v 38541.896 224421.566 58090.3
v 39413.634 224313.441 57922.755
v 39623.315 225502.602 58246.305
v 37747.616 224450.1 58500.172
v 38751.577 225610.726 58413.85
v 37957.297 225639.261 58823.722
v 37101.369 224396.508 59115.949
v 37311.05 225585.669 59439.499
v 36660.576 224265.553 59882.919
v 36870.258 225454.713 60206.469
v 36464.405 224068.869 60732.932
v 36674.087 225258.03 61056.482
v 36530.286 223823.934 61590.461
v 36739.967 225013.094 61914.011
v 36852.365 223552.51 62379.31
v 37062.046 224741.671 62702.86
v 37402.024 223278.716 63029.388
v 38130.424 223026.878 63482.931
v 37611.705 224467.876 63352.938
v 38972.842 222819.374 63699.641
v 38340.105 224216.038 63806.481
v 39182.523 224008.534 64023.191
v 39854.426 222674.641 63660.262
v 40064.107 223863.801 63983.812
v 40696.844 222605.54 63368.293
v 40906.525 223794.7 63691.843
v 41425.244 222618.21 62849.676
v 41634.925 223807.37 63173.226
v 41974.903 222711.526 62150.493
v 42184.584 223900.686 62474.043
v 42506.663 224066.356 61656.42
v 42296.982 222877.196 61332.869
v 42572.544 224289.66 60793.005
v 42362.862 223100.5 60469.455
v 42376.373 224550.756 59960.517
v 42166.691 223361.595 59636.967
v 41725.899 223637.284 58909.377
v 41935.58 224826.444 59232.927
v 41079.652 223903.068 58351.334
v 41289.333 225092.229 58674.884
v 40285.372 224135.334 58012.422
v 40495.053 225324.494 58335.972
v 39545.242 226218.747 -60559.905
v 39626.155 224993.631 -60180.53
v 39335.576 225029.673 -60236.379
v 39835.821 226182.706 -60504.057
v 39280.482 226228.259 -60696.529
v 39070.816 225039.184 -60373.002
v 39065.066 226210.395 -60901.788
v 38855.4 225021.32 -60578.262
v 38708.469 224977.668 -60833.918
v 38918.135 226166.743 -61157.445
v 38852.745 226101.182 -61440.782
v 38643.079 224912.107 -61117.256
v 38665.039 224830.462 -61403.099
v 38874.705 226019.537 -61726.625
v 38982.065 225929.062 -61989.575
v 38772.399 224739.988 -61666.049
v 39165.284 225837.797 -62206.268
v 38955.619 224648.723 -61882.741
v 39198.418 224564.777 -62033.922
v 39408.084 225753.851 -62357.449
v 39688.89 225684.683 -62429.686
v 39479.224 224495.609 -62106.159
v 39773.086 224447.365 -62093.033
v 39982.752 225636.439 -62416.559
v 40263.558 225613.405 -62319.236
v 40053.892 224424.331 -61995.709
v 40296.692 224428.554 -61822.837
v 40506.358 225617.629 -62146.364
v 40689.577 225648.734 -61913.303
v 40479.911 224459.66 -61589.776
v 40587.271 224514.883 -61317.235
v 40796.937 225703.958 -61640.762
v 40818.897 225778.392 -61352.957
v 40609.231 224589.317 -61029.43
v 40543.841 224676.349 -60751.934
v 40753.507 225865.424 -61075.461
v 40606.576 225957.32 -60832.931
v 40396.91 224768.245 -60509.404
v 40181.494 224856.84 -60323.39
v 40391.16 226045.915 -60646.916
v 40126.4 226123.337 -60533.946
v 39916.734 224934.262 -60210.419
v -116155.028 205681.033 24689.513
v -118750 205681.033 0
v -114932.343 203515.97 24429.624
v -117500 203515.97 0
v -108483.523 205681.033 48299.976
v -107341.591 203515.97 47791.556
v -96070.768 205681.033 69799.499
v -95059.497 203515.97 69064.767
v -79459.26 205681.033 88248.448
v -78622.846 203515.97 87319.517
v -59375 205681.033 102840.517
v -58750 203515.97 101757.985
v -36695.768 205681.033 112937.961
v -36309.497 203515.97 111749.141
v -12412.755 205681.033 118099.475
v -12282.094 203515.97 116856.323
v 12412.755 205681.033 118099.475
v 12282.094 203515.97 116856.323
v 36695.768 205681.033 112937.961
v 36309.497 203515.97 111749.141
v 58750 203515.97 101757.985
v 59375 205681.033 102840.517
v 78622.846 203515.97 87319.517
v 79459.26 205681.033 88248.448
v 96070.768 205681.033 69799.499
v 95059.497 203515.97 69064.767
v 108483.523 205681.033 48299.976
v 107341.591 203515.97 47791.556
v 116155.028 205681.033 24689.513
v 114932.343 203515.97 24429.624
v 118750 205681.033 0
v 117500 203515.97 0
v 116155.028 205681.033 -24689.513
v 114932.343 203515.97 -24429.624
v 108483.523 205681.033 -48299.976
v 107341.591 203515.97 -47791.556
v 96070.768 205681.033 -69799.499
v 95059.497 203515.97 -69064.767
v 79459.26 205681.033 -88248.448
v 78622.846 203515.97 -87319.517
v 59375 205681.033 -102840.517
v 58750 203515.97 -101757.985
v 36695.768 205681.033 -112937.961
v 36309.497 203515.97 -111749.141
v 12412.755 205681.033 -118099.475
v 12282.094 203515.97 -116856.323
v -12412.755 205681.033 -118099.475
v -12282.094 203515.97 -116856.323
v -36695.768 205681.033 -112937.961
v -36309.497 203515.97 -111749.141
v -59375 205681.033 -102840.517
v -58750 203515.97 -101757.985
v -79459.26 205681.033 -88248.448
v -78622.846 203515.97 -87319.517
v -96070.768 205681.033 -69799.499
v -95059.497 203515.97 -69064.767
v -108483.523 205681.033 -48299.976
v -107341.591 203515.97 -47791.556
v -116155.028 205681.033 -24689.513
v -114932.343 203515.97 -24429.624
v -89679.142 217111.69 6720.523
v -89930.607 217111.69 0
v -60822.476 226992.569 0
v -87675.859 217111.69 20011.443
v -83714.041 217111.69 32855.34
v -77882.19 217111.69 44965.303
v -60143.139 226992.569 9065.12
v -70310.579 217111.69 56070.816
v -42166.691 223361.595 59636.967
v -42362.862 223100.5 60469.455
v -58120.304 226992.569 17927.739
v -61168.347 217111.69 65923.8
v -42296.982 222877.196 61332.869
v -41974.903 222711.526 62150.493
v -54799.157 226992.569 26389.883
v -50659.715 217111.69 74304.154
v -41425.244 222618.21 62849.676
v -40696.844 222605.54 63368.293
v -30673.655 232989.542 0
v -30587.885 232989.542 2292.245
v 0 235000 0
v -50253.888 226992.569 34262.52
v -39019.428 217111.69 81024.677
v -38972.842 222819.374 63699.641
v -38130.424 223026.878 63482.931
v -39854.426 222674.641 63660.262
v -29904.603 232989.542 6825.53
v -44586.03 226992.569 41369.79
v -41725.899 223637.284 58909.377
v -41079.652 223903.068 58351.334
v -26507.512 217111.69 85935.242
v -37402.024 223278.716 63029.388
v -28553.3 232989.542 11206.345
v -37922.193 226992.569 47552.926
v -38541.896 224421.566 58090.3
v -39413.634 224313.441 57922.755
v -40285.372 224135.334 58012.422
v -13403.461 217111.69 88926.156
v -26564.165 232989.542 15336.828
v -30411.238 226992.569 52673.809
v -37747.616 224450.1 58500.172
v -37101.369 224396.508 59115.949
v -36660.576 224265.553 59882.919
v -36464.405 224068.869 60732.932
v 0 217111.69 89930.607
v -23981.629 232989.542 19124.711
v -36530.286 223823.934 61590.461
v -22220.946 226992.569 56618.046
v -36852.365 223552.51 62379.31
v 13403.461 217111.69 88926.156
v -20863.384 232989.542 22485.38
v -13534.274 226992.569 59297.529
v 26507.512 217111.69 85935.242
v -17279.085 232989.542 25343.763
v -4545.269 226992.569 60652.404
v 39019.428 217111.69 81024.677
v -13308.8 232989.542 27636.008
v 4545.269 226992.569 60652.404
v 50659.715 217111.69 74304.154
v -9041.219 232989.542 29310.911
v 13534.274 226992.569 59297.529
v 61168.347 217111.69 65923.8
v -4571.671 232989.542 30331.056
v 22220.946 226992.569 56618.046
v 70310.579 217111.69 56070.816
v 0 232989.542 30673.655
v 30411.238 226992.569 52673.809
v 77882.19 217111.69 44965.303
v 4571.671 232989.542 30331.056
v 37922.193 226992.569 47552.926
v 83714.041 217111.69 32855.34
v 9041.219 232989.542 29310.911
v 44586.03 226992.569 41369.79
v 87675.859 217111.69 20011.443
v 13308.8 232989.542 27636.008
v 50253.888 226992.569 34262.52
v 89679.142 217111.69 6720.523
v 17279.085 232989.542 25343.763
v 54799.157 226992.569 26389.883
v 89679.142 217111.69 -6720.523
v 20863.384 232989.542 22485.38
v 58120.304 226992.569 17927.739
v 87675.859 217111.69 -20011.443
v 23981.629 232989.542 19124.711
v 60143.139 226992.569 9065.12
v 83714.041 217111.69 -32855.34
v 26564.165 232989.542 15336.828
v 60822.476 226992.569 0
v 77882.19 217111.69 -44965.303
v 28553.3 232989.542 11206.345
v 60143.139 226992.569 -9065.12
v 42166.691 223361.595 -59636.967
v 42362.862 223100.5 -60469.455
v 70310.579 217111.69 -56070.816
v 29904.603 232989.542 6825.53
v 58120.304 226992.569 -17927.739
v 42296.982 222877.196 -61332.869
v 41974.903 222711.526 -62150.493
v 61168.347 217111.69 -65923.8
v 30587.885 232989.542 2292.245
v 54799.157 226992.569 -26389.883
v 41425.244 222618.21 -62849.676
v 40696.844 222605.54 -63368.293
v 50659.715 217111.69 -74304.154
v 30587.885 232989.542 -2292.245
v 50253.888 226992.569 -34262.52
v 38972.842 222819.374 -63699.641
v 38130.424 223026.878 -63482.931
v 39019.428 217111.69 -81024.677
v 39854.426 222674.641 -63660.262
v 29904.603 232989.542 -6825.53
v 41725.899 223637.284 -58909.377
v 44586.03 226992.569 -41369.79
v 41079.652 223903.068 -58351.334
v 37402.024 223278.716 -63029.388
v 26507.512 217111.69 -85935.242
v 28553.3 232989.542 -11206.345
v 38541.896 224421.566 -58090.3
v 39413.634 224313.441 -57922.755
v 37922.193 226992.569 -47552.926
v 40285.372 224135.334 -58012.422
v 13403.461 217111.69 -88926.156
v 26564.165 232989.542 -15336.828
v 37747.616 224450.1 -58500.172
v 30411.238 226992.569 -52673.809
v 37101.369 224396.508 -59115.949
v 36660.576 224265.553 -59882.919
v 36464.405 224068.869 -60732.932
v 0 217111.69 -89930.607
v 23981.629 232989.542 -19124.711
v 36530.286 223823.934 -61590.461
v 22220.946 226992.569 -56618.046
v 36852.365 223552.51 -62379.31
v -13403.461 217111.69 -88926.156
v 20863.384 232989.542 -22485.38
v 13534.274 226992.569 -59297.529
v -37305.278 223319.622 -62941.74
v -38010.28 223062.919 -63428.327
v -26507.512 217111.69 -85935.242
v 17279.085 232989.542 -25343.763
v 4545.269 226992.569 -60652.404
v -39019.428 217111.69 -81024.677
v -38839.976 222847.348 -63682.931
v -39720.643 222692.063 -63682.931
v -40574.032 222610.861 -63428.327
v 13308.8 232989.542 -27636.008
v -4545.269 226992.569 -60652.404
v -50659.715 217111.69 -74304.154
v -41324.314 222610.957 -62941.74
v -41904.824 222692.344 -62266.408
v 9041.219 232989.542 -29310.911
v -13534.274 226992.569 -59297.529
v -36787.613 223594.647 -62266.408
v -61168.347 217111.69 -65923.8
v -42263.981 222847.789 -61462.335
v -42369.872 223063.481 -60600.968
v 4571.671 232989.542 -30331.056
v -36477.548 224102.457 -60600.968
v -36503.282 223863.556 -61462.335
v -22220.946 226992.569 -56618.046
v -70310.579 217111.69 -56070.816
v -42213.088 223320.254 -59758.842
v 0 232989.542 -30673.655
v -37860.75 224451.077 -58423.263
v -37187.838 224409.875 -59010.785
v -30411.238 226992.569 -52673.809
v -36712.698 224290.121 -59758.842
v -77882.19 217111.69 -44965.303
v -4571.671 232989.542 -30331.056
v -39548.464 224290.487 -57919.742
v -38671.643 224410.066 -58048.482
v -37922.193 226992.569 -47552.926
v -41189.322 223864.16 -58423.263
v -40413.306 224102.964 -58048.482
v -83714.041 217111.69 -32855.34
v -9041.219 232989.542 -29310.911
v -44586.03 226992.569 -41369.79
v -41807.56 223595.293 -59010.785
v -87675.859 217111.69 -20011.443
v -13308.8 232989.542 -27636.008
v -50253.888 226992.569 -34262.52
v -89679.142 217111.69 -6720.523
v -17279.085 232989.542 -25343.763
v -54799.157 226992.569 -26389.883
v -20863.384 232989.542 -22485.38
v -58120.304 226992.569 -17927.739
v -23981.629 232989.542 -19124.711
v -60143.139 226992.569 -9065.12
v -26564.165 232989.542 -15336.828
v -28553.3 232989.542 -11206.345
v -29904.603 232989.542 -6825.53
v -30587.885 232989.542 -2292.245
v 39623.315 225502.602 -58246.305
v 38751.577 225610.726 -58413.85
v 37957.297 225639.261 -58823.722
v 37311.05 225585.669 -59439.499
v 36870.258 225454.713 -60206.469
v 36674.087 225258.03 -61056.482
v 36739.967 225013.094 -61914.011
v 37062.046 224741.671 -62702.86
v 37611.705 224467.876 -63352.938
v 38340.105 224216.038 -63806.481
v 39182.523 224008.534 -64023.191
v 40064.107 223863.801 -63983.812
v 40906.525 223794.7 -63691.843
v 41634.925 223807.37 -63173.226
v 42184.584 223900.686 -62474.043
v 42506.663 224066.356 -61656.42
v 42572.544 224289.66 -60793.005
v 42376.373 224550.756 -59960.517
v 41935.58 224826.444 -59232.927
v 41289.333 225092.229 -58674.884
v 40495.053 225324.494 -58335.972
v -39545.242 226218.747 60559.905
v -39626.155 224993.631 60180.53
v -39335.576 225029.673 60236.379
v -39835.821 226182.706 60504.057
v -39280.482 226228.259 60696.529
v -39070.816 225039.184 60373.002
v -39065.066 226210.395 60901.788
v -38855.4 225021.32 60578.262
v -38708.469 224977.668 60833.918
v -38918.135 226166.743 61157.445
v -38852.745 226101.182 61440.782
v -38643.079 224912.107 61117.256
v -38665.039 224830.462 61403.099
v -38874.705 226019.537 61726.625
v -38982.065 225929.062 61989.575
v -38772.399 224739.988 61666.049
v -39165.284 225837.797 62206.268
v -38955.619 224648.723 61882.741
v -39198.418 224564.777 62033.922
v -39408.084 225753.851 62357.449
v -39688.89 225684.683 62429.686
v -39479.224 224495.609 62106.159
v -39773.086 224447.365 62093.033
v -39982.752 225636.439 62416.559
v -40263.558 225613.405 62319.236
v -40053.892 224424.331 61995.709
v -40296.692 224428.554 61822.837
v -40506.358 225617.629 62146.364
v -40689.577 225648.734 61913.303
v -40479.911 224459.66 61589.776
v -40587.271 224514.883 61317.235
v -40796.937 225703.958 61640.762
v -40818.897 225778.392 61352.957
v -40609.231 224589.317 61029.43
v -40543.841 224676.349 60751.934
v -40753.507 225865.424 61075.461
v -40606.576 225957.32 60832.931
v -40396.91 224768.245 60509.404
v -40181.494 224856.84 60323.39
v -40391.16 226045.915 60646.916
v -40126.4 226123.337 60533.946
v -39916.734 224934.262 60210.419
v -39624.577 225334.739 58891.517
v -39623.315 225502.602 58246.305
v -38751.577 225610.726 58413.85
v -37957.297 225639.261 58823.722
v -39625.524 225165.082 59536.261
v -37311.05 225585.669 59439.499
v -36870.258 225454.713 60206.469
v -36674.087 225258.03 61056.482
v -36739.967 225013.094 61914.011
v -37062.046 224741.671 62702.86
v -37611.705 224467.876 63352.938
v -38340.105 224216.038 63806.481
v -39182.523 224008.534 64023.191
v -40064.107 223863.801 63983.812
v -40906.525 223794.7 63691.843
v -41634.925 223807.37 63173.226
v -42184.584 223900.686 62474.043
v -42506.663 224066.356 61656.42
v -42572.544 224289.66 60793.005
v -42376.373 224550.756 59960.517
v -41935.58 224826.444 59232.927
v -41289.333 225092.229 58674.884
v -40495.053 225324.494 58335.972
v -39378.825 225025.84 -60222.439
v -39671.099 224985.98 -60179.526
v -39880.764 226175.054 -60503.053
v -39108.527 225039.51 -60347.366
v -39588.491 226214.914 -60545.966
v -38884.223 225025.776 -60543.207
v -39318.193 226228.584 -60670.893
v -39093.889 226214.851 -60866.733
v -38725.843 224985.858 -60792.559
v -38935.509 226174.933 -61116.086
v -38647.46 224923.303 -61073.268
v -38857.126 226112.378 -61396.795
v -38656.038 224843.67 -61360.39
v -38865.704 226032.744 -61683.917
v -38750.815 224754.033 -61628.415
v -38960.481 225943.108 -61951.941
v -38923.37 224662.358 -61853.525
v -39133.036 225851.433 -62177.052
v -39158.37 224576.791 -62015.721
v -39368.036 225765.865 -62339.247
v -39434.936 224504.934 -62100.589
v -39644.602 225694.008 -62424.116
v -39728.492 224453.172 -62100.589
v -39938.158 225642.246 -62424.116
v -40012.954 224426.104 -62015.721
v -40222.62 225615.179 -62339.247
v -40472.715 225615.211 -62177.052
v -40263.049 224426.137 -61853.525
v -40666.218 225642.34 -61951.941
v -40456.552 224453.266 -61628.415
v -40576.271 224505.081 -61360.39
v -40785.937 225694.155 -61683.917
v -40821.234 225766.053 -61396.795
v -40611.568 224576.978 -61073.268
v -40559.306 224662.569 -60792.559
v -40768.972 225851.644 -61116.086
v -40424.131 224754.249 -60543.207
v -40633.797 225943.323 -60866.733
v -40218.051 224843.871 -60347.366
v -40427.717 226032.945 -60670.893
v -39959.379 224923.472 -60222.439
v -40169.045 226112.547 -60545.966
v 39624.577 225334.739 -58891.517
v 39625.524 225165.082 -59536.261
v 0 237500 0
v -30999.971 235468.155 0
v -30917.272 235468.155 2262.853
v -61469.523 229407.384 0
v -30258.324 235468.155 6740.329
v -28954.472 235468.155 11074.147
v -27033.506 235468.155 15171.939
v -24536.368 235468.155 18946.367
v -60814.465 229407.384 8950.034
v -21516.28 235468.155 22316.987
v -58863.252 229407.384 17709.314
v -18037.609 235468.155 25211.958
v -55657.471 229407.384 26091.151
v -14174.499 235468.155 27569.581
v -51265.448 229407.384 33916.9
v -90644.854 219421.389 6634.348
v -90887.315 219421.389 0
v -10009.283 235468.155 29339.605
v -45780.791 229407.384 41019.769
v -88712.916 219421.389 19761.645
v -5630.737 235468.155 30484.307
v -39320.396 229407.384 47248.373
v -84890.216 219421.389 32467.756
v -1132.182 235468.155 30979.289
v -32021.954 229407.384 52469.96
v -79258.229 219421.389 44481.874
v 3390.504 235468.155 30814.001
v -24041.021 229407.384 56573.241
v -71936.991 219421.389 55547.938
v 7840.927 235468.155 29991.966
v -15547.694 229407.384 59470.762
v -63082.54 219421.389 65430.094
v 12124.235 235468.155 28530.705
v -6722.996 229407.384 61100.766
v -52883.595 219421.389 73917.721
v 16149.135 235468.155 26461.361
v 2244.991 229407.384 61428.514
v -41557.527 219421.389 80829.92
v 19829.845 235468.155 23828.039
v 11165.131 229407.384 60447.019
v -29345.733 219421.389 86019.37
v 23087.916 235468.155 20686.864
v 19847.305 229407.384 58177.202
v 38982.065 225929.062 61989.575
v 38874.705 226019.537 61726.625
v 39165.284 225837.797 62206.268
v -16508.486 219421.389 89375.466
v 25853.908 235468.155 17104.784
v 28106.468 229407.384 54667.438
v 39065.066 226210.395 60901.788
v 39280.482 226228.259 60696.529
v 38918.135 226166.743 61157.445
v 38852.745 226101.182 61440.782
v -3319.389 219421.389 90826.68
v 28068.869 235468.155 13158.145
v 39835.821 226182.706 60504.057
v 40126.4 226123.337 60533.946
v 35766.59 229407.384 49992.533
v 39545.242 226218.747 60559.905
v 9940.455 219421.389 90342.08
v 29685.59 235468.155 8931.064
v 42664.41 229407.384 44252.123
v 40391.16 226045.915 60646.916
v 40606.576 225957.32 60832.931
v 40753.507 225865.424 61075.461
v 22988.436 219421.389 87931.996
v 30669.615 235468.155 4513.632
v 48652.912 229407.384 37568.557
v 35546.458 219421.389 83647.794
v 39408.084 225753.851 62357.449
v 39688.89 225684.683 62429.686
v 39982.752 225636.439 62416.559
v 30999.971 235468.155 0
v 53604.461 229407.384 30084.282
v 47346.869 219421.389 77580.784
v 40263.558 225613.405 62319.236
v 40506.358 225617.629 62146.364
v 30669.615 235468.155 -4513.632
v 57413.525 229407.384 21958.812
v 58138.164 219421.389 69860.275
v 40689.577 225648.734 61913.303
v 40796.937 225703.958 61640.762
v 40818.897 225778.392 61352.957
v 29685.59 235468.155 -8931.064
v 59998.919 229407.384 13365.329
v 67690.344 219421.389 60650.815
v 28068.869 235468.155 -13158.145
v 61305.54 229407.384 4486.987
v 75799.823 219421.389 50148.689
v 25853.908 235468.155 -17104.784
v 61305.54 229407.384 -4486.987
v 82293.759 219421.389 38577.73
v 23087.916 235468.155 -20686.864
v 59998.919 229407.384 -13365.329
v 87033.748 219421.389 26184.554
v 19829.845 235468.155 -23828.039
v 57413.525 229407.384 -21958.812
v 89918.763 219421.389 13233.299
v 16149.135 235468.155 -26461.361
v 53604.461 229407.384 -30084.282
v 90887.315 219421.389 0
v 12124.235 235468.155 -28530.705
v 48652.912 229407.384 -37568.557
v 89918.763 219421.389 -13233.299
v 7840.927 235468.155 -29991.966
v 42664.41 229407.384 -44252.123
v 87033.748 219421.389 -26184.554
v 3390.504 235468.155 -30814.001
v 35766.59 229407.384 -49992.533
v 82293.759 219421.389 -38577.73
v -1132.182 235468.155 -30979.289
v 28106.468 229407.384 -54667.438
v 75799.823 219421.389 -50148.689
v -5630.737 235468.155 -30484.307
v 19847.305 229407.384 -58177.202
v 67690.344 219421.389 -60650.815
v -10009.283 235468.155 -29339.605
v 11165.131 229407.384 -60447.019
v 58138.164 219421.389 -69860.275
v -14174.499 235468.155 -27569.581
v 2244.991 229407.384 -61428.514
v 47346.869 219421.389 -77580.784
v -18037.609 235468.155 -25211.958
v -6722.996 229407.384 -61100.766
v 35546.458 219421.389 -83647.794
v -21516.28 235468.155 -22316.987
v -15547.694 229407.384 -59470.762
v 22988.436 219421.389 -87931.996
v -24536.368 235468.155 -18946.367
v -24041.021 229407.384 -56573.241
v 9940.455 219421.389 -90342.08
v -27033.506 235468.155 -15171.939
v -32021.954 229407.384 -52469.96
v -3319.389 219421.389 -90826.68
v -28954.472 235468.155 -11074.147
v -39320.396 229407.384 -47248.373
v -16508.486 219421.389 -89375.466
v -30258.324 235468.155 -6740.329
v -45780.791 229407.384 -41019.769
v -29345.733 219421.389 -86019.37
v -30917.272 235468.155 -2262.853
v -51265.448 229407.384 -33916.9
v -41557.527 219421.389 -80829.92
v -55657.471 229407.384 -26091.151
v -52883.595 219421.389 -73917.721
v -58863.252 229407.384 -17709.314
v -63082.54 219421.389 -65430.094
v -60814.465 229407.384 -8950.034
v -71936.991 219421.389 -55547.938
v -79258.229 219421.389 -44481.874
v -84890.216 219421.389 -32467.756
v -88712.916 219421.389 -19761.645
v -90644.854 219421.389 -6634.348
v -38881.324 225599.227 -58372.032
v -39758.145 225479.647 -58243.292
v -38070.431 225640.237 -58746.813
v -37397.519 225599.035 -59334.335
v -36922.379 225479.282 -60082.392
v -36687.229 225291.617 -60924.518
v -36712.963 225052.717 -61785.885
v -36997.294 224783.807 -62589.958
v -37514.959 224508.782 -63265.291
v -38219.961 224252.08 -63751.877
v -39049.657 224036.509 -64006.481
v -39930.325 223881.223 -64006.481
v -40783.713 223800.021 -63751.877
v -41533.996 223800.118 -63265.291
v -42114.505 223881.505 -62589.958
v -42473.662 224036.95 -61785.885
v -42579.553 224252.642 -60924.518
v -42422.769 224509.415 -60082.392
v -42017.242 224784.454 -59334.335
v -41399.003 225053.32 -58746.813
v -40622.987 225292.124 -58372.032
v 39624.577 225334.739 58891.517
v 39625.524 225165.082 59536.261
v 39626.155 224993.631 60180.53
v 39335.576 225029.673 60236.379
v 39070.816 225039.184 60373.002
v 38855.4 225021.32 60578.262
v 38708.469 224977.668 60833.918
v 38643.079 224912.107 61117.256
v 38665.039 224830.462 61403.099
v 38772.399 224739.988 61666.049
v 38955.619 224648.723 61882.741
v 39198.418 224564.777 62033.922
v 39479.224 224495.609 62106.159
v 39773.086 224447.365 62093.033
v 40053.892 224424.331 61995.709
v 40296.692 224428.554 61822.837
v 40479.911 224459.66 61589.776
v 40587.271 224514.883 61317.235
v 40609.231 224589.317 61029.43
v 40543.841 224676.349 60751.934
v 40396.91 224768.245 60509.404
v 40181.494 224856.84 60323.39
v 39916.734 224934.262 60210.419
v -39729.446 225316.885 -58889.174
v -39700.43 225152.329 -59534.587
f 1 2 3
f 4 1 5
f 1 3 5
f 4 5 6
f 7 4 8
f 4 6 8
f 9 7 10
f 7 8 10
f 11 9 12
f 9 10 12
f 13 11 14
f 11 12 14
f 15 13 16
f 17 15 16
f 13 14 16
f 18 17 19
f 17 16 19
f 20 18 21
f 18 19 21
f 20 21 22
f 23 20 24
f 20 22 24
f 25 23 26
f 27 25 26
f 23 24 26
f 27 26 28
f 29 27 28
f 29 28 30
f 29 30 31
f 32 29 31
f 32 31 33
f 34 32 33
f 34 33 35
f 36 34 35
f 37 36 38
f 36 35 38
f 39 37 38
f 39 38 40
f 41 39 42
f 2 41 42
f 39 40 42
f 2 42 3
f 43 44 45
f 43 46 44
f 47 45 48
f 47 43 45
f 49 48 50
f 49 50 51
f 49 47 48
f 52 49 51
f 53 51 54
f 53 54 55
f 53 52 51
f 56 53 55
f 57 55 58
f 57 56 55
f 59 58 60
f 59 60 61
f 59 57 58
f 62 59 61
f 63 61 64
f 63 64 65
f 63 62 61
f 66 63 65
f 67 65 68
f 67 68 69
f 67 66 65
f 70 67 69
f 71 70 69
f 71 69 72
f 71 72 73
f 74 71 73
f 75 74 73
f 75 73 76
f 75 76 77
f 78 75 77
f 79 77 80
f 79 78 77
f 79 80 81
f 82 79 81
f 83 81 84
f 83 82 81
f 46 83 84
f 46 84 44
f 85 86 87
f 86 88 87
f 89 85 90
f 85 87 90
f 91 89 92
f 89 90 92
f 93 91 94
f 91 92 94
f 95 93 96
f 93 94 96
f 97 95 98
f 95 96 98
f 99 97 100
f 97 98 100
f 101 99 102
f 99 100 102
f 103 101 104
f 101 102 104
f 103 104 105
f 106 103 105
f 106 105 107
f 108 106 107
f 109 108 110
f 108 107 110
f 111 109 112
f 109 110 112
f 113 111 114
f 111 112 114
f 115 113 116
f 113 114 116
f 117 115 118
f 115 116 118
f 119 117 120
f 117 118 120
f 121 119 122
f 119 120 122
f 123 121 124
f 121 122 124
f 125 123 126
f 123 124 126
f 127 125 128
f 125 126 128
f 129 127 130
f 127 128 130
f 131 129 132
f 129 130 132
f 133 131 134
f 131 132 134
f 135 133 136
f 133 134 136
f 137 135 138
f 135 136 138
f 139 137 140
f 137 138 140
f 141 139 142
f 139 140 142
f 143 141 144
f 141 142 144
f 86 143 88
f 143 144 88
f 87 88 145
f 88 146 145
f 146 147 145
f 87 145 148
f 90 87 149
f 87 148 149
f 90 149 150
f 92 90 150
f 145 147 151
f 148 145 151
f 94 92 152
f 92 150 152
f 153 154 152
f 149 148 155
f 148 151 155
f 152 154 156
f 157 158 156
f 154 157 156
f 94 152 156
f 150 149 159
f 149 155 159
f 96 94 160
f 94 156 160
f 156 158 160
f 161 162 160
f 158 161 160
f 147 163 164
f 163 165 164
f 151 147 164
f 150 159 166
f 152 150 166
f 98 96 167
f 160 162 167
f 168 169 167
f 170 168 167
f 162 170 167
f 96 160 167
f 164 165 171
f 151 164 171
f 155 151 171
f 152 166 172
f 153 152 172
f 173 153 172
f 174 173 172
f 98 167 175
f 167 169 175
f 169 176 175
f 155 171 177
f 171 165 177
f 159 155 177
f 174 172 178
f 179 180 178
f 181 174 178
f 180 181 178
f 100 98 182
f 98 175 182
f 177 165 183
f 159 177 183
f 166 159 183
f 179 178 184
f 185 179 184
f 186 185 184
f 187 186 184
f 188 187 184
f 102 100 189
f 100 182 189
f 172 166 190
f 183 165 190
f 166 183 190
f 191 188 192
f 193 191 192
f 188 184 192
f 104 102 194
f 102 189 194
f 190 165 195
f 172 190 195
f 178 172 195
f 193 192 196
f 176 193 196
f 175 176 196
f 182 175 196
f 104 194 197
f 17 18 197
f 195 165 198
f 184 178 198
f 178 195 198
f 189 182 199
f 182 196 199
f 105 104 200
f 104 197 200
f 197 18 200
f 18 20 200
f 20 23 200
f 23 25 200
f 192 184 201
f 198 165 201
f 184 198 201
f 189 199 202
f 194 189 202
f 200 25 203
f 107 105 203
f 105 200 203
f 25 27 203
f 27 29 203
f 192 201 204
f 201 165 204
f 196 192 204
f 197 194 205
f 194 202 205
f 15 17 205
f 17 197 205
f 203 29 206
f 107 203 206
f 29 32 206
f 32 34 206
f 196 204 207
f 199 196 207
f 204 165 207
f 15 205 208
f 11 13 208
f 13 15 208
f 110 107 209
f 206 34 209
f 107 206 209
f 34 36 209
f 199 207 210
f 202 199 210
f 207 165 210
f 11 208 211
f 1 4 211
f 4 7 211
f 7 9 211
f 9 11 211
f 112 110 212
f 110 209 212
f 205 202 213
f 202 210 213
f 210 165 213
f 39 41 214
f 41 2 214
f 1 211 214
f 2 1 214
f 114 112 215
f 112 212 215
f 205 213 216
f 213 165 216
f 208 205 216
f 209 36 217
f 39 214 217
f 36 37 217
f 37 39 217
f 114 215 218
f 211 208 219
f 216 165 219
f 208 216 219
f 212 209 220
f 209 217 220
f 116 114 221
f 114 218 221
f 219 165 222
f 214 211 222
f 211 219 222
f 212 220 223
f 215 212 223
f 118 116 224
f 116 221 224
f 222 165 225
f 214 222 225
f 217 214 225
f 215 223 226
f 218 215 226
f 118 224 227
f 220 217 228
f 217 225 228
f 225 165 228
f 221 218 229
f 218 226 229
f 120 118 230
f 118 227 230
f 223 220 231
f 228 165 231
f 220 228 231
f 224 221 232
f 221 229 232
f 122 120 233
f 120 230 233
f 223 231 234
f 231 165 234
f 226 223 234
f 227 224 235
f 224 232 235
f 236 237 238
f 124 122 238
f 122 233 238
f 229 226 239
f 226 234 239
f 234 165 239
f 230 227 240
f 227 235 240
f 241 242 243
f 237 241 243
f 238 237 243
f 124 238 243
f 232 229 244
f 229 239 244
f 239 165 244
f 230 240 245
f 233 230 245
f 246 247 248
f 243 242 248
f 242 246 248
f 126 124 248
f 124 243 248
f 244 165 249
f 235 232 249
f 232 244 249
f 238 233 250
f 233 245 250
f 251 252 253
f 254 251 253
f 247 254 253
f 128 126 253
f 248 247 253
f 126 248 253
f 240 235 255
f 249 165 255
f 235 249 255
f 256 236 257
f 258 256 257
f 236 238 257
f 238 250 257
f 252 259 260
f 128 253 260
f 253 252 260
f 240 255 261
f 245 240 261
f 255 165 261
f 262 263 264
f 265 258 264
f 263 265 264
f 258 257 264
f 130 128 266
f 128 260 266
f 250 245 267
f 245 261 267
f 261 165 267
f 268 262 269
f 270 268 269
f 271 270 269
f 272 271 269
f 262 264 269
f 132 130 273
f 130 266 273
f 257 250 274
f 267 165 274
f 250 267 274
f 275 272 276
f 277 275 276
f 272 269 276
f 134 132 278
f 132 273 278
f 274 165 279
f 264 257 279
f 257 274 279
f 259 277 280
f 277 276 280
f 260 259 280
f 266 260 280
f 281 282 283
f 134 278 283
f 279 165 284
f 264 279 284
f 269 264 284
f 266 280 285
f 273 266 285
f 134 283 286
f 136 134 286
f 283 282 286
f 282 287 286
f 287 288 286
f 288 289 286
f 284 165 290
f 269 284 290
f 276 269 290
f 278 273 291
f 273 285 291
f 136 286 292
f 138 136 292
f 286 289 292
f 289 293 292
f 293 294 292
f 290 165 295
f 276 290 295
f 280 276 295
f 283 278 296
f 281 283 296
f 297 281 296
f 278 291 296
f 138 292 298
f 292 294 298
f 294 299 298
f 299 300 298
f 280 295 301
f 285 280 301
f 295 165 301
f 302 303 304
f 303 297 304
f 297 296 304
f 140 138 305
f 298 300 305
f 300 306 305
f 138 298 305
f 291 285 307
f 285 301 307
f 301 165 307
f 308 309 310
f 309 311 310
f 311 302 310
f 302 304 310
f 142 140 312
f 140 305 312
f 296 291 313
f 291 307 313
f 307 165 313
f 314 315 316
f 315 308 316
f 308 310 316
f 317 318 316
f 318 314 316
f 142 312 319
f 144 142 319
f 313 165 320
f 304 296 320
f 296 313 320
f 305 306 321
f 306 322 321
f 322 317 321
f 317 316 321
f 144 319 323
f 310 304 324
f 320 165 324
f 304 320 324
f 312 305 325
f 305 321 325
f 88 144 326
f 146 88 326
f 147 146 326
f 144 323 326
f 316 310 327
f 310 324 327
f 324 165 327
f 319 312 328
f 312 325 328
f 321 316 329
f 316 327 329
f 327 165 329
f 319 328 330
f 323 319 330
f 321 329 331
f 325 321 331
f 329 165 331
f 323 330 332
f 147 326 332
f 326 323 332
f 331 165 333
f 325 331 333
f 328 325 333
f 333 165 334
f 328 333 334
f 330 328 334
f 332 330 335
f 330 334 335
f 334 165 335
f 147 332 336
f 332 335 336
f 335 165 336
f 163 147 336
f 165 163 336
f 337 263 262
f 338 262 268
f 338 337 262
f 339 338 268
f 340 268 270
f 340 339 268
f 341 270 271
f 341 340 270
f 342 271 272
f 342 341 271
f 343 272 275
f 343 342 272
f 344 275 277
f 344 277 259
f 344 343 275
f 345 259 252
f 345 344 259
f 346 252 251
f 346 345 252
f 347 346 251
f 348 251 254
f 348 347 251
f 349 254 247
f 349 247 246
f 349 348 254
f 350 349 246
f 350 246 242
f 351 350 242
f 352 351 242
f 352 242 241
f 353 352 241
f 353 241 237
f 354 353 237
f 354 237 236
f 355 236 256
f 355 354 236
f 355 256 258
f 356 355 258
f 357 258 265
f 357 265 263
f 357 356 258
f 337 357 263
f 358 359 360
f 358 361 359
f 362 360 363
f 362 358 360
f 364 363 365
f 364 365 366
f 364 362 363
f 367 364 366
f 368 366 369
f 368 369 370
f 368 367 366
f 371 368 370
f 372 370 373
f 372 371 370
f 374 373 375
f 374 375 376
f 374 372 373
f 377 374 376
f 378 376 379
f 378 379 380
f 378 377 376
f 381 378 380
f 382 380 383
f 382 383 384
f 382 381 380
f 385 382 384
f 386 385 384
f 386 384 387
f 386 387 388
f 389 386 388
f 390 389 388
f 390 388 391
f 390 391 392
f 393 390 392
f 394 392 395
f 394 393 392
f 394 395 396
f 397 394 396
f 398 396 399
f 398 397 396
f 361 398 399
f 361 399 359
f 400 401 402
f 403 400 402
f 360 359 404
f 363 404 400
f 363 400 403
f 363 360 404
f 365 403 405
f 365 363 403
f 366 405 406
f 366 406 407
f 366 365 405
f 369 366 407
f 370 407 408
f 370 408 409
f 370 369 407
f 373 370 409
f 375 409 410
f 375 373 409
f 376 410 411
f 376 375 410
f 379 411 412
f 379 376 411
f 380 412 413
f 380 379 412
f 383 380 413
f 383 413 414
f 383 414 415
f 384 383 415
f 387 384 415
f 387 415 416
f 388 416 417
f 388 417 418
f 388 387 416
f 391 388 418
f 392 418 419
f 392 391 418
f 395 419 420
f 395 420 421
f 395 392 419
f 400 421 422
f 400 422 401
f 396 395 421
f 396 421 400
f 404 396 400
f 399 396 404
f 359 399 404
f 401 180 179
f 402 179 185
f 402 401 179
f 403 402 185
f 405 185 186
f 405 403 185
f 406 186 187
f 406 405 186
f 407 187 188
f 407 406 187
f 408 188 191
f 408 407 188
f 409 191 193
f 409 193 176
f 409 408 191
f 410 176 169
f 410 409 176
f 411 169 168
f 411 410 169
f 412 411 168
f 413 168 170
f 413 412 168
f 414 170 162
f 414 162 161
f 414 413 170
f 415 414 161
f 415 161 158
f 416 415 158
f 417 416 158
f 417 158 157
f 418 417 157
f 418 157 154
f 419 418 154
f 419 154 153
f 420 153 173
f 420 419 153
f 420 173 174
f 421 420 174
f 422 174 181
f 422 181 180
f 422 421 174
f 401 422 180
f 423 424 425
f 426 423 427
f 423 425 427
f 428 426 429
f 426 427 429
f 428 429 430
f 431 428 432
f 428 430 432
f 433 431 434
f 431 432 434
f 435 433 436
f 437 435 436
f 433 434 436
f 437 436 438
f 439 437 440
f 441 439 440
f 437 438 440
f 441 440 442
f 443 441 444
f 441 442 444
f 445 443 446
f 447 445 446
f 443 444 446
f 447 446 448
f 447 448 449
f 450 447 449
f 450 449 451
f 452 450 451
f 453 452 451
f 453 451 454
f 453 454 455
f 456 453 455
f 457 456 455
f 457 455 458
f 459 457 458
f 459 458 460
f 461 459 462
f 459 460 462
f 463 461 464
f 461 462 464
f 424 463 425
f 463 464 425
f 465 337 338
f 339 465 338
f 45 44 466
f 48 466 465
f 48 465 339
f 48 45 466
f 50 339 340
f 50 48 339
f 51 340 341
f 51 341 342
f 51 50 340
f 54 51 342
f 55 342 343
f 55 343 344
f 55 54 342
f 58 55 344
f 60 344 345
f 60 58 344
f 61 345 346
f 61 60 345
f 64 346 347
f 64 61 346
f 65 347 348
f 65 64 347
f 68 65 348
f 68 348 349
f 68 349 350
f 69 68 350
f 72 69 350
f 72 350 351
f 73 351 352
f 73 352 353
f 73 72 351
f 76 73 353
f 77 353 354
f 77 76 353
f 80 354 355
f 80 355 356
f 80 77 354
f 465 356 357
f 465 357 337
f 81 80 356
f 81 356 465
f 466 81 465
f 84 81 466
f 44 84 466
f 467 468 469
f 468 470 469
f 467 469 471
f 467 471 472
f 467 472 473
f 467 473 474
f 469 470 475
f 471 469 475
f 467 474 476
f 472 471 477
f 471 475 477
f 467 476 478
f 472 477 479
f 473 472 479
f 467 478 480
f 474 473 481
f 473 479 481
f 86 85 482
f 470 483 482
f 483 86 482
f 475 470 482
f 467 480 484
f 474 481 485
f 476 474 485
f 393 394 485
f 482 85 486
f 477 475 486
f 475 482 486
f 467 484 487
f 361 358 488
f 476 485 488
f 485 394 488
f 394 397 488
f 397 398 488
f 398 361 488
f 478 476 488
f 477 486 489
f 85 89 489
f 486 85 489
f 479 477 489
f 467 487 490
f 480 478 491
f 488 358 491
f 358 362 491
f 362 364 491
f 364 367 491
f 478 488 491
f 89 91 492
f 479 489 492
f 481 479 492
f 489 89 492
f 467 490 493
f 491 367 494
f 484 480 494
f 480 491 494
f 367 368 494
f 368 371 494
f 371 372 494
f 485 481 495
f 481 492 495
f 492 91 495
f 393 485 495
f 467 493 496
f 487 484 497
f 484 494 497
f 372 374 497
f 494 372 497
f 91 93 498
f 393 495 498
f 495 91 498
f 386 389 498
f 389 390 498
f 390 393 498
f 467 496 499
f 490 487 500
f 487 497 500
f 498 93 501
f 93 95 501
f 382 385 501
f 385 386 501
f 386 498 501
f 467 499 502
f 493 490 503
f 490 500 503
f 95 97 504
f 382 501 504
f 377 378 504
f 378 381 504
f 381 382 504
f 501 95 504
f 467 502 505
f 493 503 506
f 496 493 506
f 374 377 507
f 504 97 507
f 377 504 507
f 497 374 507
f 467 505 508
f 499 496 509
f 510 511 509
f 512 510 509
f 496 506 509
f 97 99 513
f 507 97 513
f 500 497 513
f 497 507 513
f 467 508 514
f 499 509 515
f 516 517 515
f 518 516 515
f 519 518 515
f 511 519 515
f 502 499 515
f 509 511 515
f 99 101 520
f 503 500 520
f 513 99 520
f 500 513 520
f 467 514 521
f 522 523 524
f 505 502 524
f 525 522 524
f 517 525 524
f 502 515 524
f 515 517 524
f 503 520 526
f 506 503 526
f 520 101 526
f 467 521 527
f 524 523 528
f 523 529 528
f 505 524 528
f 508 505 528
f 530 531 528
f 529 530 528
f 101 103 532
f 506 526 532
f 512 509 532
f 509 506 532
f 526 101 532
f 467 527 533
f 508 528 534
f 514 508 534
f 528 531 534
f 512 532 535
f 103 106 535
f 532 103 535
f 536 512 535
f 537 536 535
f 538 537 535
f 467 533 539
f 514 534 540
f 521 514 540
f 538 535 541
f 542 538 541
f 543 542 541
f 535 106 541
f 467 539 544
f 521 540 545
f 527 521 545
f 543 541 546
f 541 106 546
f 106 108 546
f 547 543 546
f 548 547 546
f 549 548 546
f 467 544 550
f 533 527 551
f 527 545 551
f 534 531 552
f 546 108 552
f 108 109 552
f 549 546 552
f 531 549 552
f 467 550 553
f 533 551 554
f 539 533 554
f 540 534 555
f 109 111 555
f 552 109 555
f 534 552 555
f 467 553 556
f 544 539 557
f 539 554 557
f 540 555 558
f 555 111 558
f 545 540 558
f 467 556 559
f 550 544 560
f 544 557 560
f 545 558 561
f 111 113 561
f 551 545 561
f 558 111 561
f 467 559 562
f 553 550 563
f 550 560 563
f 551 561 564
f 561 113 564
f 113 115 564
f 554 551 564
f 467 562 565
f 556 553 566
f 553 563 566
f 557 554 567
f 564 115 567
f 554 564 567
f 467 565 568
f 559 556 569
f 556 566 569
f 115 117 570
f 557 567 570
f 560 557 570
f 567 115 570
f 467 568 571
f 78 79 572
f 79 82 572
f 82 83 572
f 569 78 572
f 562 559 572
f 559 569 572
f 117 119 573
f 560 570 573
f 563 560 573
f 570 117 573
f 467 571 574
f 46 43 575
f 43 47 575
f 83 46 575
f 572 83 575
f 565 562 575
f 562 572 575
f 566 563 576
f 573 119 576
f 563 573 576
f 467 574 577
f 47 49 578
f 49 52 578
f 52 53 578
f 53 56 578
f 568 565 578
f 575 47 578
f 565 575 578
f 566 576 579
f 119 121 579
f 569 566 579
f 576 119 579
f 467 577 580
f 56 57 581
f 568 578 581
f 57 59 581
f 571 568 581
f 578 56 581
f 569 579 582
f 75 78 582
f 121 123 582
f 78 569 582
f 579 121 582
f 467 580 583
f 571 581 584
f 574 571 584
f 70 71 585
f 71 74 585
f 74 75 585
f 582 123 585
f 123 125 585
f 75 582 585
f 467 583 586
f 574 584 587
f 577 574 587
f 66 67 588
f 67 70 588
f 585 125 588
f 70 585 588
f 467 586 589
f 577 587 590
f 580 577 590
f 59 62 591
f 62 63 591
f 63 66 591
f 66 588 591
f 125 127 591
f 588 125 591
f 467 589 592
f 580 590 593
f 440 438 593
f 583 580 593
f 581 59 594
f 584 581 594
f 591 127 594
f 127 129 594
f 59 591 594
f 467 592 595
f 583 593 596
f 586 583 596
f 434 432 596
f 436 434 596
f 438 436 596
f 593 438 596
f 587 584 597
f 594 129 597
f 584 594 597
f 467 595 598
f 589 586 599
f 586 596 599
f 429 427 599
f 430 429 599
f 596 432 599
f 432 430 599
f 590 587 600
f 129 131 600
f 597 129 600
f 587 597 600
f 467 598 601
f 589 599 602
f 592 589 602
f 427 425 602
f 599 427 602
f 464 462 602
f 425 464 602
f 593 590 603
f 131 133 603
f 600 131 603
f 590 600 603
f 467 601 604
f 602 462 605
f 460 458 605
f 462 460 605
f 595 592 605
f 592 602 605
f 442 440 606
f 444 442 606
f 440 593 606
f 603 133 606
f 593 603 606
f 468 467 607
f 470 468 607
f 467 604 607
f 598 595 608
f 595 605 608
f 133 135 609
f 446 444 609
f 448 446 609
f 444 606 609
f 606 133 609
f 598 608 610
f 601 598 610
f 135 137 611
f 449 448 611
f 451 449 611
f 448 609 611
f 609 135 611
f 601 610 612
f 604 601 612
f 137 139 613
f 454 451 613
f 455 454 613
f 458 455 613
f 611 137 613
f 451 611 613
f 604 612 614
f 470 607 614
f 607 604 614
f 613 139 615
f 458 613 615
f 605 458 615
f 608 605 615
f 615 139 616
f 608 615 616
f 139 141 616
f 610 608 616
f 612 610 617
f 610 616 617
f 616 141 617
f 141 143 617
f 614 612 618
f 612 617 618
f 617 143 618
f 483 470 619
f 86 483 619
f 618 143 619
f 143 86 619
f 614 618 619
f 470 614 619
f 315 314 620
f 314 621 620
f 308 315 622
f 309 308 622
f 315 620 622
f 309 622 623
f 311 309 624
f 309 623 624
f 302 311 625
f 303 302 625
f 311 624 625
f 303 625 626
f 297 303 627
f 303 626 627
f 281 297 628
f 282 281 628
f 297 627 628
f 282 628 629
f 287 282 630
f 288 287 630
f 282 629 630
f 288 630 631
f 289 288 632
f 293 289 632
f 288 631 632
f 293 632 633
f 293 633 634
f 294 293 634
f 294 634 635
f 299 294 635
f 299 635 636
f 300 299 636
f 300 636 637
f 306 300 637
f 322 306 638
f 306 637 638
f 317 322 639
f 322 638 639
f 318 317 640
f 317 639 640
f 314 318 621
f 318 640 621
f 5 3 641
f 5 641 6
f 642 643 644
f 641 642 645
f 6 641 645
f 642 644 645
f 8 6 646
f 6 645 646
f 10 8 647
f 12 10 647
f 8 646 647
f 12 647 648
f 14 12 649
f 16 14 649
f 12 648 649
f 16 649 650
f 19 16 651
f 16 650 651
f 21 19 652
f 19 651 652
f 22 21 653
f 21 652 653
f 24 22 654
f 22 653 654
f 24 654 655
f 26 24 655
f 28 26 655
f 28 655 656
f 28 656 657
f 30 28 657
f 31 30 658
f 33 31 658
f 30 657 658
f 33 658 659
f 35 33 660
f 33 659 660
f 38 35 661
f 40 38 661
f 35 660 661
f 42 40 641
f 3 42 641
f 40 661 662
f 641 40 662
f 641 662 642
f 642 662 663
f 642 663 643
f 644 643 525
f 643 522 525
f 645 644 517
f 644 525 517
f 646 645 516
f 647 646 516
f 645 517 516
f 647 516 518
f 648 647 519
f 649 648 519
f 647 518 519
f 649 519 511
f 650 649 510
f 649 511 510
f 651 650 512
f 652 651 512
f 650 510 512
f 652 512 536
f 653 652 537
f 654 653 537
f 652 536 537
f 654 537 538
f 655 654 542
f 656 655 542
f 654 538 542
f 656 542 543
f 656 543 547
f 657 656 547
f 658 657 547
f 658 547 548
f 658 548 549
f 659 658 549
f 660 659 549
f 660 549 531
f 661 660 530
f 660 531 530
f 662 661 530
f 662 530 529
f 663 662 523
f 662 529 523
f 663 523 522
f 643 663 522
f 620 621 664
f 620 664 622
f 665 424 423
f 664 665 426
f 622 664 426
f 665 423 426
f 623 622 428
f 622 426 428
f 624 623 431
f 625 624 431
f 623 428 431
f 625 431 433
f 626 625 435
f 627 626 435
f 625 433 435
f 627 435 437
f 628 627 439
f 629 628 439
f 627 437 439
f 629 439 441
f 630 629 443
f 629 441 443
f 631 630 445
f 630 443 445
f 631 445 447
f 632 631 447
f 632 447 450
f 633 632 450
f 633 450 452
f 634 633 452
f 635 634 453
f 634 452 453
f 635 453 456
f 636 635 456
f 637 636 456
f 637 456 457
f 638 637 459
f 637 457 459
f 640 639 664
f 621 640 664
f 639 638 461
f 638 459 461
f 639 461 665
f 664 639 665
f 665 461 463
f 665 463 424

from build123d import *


with BuildPart() as part:
    # Sketch1 → Revolve1 (revolve)
    with BuildSketch(Plane.XY):
        with BuildLine():
            ThreePointArc((-118125, 204598.501644073), (-61145.999405471, 228199.976460792), (0, 236250))
            Line((0, 236250), (0, 237500))
            ThreePointArc((0, 237500), (-61469.523211849, 229407.383743654), (-118750, 205681.033398804))
            Line((-118750, 205681.033398804), (-118125, 204598.501644073))
        make_face()
        with BuildLine():
            ThreePointArc((-117500, 203515.969889343), (-60822.475599093, 226992.569177931), (0, 235000))
            Line((0, 235000), (0, 236250))
            ThreePointArc((0, 236250), (-61145.999405471, 228199.976460792), (-118125, 204598.501644073))
            Line((-118125, 204598.501644073), (-117500, 203515.969889343))
        make_face()
    revolve(axis=Axis((0, 0, 0), (0, 1, 0)))

    # Sketch3 → Cut-Revolve1 (revolve, cut)
    with BuildSketch(Plane(origin=(0, 0, 0), x_dir=(0, 0, -1), z_dir=(0.984807753012208, -0.17364817766693072, 0)), mode=Mode.PRIVATE) as cut_revolve1_sk:
        with BuildLine():
            Line((-61469.523211849, 229407.383743654), (-61145.999405471, 228199.976460792))
            ThreePointArc((-61145.999405471, 228199.976460792), (-60662.898468624, 228328.875198441), (-60179.525811555, 228456.751209275))
            Line((-60179.525811553, 228456.751209275), (-60503.052500945, 229664.169251688))
            ThreePointArc((-60503.052500946, 229664.169251688), (-60986.423007114, 229536.285168157), (-61469.523211849, 229407.383743654))
        make_face()
        with BuildLine():
            Line((-61145.999405471, 228199.976460792), (-60822.475599093, 226992.569177931))
            ThreePointArc((-60822.475599093, 226992.569177931), (-60339.373922288, 227121.465200157), (-59855.999091498, 227249.333052396))
            Line((-59855.999091491, 227249.333052397), (-60179.525811553, 228456.751209275))
            ThreePointArc((-60179.525811555, 228456.751209275), (-60662.898468624, 228328.875198441), (-61145.999405471, 228199.976460792))
        make_face()
        with BuildLine():
            Line((-60179.525811553, 228456.751209275), (-59855.999091491, 227249.333052397))
            ThreePointArc((-59855.999091498, 227249.333052396), (-58888.403659222, 227501.991012098), (-57919.741808911, 227750.529107594))
            Line((-57919.741808911, 227750.529107594), (-58243.291841278, 228958.034267181))
            ThreePointArc((-58243.291841278, 228958.034267181), (-59211.939306065, 228709.441745668), (-60179.525811555, 228456.751209275))
        make_face()
    cut_revolve1 = revolve(cut_revolve1_sk.sketch.rotate(Axis((35107.466143794, 199104.334474144, 54172.852994611), (0.16773125949652093, 0.9512512425641976, 0.25881904510252157)), 2.612981902), axis=Axis((35107.466143794, 199104.334474144, 54172.852994611), (0.16773125949652093, 0.9512512425641976, 0.25881904510252157)), mode=Mode.SUBTRACT)

    # Mirror1: Cut-Revolve1 across plane
    add(cut_revolve1.mirror(Plane(origin=(0, 0, 0), x_dir=(0, 0, 1), z_dir=(1, 0, 0))), mode=Mode.SUBTRACT)

    # Mirror2: Cut-Revolve1 across plane
    add(cut_revolve1.mirror(Plane.XY), mode=Mode.SUBTRACT)

    # Mirror2 copy 1 sketch → Mirror2 copy 1 (revolve, cut)
    with BuildSketch(Plane(origin=(0, 0, 0), x_dir=(0, 0, 1), z_dir=(-0.984807753012208, -0.17364817766693072, 0))):
        with BuildLine():
            Line((-61469.523211849, 229407.383743654), (-61145.999405471, 228199.976460792))
            ThreePointArc((-61145.999405471, 228199.976460792), (-60662.898468624, 228328.875198441), (-60179.525811555, 228456.751209275))
            Line((-60179.525811553, 228456.751209275), (-60503.052500945, 229664.169251688))
            ThreePointArc((-60503.052500946, 229664.169251688), (-60986.423007114, 229536.285168157), (-61469.523211849, 229407.383743654))
        make_face()
        with BuildLine():
            Line((-61145.999405471, 228199.976460792), (-60822.475599093, 226992.569177931))
            ThreePointArc((-60822.475599093, 226992.569177931), (-60339.373922288, 227121.465200157), (-59855.999091498, 227249.333052396))
            Line((-59855.999091491, 227249.333052397), (-60179.525811553, 228456.751209275))
            ThreePointArc((-60179.525811555, 228456.751209275), (-60662.898468624, 228328.875198441), (-61145.999405471, 228199.976460792))
        make_face()
        with BuildLine():
            Line((-60179.525811553, 228456.751209275), (-59855.999091491, 227249.333052397))
            ThreePointArc((-59855.999091498, 227249.333052396), (-58888.403659222, 227501.991012098), (-57919.741808911, 227750.529107594))
            Line((-57919.741808911, 227750.529107594), (-58243.291841278, 228958.034267181))
            ThreePointArc((-58243.291841278, 228958.034267181), (-59211.939306065, 228709.441745668), (-60179.525811555, 228456.751209275))
        make_face()
    revolve(axis=Axis((-35107.466143794, 199104.334474144, -54172.852994611), (-0.16773125949652093, 0.9512512425641976, -0.25881904510252157)), mode=Mode.SUBTRACT)


solid = part.part
